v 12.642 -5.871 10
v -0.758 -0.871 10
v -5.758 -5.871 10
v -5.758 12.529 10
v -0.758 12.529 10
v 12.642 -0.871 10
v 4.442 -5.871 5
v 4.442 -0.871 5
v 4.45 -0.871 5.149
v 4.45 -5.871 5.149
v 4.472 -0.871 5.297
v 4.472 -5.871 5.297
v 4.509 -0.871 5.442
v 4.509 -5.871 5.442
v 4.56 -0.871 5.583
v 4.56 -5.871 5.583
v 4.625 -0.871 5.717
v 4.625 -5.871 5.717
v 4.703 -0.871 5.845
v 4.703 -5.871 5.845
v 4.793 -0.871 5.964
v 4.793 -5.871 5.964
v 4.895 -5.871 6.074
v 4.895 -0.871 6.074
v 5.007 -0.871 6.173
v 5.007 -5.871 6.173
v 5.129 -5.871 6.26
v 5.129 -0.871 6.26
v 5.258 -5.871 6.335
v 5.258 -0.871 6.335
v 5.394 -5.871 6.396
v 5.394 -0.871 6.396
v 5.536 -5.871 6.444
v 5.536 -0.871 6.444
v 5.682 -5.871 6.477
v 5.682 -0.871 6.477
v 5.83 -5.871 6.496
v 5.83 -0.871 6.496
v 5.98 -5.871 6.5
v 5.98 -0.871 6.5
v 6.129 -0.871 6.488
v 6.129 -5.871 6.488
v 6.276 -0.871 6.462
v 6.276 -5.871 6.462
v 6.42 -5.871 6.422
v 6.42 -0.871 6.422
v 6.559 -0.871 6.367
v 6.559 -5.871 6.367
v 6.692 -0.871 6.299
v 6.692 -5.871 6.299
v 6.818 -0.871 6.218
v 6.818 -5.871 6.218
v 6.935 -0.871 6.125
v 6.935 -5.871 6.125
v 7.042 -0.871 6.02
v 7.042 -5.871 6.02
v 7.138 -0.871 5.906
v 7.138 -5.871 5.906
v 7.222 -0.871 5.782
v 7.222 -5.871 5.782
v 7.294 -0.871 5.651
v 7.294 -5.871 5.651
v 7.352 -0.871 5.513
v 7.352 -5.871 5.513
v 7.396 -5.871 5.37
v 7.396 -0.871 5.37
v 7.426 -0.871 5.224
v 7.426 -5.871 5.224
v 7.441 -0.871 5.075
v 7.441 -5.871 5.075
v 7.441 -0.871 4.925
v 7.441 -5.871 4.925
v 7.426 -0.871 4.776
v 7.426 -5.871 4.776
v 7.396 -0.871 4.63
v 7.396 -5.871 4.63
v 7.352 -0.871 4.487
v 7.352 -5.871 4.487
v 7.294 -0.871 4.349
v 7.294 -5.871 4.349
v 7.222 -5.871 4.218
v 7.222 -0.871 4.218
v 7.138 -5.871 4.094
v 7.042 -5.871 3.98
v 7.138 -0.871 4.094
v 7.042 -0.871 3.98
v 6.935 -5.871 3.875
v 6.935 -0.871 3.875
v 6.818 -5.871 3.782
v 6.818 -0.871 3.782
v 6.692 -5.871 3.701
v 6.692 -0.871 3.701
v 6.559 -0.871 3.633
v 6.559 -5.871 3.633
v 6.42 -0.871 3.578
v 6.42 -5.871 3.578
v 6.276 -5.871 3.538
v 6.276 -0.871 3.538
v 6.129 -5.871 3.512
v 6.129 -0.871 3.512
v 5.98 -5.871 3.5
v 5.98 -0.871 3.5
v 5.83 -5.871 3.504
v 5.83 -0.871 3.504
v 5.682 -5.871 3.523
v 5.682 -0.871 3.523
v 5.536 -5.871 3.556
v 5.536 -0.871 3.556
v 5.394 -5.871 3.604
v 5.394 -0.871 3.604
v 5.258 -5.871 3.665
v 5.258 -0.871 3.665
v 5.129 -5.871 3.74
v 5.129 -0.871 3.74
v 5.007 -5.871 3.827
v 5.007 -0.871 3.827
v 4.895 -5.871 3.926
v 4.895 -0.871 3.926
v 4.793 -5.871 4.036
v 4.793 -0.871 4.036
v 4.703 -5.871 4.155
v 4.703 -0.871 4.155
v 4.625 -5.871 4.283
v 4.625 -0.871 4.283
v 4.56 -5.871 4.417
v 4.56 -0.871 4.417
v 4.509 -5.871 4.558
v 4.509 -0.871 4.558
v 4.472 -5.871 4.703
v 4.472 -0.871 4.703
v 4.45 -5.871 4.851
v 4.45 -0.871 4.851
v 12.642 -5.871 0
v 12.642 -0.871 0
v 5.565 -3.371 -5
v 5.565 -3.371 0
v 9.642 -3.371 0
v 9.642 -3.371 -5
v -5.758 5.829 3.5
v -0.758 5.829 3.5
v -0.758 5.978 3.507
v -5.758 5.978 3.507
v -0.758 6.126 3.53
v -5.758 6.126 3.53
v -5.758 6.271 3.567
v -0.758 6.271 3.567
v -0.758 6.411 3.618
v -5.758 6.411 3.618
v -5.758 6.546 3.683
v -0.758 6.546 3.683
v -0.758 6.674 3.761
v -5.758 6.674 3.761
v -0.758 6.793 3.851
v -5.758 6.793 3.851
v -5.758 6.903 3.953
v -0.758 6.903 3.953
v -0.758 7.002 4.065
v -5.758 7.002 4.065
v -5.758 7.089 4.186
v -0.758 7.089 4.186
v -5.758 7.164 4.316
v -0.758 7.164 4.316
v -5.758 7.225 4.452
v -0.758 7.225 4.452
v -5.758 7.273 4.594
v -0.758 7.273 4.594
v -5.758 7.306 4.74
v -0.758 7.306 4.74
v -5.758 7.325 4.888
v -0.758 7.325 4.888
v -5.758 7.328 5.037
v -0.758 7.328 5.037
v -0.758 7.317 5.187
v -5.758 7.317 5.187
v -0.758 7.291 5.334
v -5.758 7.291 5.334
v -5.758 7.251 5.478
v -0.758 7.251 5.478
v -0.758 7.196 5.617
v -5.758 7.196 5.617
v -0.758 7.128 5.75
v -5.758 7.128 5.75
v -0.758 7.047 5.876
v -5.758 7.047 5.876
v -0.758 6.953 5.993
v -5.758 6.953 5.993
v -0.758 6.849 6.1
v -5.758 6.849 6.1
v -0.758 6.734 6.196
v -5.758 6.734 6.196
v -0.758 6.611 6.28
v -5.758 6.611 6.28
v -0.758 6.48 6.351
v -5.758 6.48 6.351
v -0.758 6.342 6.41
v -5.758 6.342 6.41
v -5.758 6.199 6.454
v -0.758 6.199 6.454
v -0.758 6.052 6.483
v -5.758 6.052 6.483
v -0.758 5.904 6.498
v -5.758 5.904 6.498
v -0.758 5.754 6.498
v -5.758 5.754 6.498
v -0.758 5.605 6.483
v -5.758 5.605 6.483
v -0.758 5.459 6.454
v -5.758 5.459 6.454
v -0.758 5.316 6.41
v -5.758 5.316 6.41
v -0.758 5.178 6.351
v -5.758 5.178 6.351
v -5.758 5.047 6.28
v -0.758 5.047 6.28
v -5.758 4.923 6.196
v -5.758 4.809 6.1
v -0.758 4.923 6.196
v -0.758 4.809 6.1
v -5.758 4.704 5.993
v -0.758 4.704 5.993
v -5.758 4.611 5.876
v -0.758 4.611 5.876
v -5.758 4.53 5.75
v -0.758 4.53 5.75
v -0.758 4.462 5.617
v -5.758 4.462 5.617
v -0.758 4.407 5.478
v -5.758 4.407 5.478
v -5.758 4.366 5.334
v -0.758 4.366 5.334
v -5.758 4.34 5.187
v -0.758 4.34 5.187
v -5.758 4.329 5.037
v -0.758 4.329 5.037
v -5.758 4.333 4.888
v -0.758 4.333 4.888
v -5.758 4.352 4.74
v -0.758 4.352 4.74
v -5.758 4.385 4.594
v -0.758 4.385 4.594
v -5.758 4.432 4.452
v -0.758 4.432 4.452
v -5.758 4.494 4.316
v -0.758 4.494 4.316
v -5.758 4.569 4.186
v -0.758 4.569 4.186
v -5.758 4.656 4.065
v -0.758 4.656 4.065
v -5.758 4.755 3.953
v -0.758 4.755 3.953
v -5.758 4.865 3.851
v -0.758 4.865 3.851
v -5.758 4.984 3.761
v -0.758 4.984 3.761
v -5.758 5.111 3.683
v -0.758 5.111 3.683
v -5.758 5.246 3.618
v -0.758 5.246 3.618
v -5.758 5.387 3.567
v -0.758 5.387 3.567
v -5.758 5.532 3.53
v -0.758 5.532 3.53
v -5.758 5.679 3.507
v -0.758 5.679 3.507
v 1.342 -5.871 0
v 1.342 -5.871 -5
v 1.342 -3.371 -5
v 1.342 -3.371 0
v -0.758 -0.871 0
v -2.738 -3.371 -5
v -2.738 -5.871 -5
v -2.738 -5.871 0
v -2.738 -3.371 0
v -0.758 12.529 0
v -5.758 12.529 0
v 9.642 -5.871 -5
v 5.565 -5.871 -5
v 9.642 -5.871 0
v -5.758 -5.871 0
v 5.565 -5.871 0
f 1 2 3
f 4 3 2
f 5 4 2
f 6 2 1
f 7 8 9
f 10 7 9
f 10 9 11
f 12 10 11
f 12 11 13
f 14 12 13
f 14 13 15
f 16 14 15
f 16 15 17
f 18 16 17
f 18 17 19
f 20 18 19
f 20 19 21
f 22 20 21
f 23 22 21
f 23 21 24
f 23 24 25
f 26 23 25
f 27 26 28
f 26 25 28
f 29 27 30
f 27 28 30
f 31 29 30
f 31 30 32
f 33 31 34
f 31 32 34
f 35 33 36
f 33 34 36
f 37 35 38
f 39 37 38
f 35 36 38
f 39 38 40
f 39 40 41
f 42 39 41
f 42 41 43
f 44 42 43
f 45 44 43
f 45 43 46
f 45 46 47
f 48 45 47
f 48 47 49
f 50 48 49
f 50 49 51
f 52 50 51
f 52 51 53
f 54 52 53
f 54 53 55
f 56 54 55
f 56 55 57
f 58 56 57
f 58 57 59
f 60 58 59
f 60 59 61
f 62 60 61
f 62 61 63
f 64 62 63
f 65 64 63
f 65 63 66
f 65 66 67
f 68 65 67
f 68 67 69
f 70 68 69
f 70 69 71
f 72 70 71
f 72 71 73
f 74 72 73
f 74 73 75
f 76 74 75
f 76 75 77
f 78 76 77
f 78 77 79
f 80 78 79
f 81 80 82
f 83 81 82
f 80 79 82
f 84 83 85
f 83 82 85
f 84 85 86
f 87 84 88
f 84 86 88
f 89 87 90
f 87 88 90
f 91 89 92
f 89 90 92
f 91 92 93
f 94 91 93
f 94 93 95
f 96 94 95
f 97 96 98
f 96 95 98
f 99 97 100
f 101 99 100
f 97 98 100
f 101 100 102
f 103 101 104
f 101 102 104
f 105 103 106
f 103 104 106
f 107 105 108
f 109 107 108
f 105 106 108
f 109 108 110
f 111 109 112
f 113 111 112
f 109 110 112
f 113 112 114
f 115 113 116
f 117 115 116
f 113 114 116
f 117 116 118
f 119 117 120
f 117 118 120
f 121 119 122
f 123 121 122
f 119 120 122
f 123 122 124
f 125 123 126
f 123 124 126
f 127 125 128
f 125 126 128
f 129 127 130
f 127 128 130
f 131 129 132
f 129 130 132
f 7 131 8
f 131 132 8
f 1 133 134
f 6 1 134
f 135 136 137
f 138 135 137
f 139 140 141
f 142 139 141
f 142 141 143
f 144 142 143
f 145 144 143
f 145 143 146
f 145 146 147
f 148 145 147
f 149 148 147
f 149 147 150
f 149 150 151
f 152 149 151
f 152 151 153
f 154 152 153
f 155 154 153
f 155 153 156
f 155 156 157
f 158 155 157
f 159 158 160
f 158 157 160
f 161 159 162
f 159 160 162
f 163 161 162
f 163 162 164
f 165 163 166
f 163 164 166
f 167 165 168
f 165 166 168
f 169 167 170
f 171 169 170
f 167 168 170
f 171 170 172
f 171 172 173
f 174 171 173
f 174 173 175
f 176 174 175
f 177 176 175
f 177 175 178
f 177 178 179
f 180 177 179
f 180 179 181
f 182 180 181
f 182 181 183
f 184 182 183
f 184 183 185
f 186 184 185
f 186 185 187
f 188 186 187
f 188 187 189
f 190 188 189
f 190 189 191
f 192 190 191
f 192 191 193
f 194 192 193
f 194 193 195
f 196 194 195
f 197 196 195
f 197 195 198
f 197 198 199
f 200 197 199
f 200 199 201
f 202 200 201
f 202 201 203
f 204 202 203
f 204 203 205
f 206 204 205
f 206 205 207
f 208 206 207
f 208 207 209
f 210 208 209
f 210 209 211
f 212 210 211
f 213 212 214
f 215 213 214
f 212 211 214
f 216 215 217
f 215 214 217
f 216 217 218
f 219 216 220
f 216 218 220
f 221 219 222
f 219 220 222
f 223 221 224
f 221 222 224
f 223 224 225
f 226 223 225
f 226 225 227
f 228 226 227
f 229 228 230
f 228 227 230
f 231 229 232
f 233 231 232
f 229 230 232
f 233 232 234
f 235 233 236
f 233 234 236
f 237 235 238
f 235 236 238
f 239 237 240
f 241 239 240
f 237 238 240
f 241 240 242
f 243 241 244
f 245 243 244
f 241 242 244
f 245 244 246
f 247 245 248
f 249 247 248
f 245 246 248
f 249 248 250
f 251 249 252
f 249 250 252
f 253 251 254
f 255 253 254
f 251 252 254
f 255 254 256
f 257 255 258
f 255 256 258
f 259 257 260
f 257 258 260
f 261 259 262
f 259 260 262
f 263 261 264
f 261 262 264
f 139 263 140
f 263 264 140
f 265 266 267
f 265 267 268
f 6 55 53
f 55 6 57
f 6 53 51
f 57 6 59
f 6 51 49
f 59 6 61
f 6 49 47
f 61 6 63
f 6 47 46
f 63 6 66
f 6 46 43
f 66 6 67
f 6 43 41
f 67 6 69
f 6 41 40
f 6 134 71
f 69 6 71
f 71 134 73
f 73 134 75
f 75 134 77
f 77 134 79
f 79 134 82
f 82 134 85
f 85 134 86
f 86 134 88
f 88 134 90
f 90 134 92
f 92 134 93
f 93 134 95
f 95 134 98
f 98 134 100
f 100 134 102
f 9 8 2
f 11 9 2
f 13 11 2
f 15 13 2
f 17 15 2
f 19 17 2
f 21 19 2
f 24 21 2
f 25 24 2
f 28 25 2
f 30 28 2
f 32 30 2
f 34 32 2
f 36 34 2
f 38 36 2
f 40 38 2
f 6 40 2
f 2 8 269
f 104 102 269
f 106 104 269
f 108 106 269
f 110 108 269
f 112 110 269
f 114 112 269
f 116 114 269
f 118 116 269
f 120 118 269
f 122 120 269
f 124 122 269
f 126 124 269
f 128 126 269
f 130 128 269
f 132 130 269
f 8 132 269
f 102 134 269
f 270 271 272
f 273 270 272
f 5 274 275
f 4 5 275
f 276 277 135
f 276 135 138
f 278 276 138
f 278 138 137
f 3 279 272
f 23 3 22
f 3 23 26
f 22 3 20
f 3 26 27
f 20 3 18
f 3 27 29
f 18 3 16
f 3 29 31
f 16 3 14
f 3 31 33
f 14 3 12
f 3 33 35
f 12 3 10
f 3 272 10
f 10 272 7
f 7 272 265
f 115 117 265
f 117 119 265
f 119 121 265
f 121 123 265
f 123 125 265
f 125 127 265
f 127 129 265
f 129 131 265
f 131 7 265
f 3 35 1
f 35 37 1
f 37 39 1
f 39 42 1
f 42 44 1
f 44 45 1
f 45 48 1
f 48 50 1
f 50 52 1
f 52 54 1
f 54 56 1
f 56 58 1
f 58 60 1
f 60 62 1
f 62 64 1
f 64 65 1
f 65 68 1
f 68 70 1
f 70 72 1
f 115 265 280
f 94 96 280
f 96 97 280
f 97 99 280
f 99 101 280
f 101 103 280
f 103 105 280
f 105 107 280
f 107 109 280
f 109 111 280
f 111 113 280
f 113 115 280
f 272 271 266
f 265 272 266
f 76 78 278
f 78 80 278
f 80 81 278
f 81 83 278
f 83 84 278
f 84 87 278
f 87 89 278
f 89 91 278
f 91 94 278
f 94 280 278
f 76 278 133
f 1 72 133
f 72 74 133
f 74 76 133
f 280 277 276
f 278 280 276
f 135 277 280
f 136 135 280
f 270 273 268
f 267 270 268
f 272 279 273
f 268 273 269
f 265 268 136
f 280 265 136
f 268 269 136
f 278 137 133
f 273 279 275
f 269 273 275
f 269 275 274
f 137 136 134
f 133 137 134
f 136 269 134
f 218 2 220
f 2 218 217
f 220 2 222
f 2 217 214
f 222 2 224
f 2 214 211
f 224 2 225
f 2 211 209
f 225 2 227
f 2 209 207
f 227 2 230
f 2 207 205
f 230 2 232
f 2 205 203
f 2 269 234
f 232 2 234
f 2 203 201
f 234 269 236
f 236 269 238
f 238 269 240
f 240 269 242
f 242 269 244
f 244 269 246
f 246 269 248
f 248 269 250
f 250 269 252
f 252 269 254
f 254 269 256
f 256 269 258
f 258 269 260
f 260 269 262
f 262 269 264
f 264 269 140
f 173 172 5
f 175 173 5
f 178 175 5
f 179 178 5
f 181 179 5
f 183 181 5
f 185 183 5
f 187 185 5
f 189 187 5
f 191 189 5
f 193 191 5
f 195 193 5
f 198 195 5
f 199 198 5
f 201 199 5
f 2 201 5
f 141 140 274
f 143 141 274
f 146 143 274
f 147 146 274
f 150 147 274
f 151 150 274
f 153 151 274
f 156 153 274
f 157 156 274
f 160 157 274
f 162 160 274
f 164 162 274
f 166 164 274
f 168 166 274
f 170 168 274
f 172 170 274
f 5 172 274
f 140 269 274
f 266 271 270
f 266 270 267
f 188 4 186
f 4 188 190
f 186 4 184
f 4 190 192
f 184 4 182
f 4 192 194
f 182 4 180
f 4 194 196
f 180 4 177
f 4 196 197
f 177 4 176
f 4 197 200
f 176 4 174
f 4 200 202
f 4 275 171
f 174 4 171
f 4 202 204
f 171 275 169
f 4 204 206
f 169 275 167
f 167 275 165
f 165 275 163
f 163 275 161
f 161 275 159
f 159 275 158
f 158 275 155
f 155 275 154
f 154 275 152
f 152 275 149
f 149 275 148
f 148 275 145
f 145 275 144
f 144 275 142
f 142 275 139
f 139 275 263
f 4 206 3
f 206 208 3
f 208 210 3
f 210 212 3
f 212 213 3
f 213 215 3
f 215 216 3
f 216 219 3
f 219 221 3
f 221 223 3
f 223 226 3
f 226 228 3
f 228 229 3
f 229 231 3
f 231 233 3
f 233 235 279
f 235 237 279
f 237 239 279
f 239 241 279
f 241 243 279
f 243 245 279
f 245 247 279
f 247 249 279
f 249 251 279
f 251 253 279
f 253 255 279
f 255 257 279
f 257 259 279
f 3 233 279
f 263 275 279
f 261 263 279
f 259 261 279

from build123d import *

# Parameters (mm, degrees)
BOSS_EXTRUDE1_DEPTH = 10
CUT_EXTRUDE1_REACH  = 22.962
SKETCH2_R           = 1.5
CUT_EXTRUDE2_REACH  = 22.893
SKETCH3_R           = 1.5
SKETCH4_W           = 4.077350098
SKETCH4_H           = 5
SKETCH4_W_2         = 4.08
BOSS_EXTRUDE2_DEPTH = 2.5


with BuildPart() as part:
    # Sketch1 → Boss-Extrude1 (new body)
    with BuildSketch(Plane.XY):
        Polygon((-0.757575758, 12.528787879), (-5.757575758, 12.528787879), (-5.757575758, -5.871212121), (12.642424242, -5.871212121), (12.642424242, -0.871212121), (-0.757575758, -0.871212121), align=None)
    extrude(amount=BOSS_EXTRUDE1_DEPTH)

    # Sketch2 → Cut-Extrude1 (cut, up to next)
    with BuildSketch(Plane(origin=(0, -0.871212121, 0), x_dir=(1, 0, 0), z_dir=(0, 1, 0)), mode=Mode.PRIVATE) as cut_extrude1_sk1:
        with Locations(Location((5.942424242, -5, 0), (0, 0, 180))):
            Circle(SKETCH2_R)
    cut_extrude1_tool1 = extrude(cut_extrude1_sk1.sketch, amount=-CUT_EXTRUDE1_REACH, mode=Mode.PRIVATE) & part.part
    add(cut_extrude1_tool1.solids().sort_by_distance((5.942424, -0.871212, 5))[0], mode=Mode.SUBTRACT)

    # Sketch3 → Cut-Extrude2 (cut, up to next)
    with BuildSketch(Plane(origin=(-0.757575758, 0, 0), x_dir=(0, 0, -1), z_dir=(1, 0, 0)), mode=Mode.PRIVATE) as cut_extrude2_sk1:
        with Locations((-5, 5.828787879)):
            Circle(SKETCH3_R)
    cut_extrude2_tool1 = extrude(cut_extrude2_sk1.sketch, amount=-CUT_EXTRUDE2_REACH, mode=Mode.PRIVATE) & part.part
    add(cut_extrude2_tool1.solids().sort_by_distance((-0.757576, 5.828788, 5))[0], mode=Mode.SUBTRACT)

    # Sketch4 → Boss-Extrude2 (add)
    with BuildSketch(Plane.XZ.offset(5.871212121)):
        with Locations((7.603749193, -2.5)):
            Rectangle(SKETCH4_W, SKETCH4_H)
        with Locations((-0.697575758, -2.5)):
            Rectangle(SKETCH4_W_2, SKETCH4_H)
    extrude(amount=-BOSS_EXTRUDE2_DEPTH)


solid = part.part
